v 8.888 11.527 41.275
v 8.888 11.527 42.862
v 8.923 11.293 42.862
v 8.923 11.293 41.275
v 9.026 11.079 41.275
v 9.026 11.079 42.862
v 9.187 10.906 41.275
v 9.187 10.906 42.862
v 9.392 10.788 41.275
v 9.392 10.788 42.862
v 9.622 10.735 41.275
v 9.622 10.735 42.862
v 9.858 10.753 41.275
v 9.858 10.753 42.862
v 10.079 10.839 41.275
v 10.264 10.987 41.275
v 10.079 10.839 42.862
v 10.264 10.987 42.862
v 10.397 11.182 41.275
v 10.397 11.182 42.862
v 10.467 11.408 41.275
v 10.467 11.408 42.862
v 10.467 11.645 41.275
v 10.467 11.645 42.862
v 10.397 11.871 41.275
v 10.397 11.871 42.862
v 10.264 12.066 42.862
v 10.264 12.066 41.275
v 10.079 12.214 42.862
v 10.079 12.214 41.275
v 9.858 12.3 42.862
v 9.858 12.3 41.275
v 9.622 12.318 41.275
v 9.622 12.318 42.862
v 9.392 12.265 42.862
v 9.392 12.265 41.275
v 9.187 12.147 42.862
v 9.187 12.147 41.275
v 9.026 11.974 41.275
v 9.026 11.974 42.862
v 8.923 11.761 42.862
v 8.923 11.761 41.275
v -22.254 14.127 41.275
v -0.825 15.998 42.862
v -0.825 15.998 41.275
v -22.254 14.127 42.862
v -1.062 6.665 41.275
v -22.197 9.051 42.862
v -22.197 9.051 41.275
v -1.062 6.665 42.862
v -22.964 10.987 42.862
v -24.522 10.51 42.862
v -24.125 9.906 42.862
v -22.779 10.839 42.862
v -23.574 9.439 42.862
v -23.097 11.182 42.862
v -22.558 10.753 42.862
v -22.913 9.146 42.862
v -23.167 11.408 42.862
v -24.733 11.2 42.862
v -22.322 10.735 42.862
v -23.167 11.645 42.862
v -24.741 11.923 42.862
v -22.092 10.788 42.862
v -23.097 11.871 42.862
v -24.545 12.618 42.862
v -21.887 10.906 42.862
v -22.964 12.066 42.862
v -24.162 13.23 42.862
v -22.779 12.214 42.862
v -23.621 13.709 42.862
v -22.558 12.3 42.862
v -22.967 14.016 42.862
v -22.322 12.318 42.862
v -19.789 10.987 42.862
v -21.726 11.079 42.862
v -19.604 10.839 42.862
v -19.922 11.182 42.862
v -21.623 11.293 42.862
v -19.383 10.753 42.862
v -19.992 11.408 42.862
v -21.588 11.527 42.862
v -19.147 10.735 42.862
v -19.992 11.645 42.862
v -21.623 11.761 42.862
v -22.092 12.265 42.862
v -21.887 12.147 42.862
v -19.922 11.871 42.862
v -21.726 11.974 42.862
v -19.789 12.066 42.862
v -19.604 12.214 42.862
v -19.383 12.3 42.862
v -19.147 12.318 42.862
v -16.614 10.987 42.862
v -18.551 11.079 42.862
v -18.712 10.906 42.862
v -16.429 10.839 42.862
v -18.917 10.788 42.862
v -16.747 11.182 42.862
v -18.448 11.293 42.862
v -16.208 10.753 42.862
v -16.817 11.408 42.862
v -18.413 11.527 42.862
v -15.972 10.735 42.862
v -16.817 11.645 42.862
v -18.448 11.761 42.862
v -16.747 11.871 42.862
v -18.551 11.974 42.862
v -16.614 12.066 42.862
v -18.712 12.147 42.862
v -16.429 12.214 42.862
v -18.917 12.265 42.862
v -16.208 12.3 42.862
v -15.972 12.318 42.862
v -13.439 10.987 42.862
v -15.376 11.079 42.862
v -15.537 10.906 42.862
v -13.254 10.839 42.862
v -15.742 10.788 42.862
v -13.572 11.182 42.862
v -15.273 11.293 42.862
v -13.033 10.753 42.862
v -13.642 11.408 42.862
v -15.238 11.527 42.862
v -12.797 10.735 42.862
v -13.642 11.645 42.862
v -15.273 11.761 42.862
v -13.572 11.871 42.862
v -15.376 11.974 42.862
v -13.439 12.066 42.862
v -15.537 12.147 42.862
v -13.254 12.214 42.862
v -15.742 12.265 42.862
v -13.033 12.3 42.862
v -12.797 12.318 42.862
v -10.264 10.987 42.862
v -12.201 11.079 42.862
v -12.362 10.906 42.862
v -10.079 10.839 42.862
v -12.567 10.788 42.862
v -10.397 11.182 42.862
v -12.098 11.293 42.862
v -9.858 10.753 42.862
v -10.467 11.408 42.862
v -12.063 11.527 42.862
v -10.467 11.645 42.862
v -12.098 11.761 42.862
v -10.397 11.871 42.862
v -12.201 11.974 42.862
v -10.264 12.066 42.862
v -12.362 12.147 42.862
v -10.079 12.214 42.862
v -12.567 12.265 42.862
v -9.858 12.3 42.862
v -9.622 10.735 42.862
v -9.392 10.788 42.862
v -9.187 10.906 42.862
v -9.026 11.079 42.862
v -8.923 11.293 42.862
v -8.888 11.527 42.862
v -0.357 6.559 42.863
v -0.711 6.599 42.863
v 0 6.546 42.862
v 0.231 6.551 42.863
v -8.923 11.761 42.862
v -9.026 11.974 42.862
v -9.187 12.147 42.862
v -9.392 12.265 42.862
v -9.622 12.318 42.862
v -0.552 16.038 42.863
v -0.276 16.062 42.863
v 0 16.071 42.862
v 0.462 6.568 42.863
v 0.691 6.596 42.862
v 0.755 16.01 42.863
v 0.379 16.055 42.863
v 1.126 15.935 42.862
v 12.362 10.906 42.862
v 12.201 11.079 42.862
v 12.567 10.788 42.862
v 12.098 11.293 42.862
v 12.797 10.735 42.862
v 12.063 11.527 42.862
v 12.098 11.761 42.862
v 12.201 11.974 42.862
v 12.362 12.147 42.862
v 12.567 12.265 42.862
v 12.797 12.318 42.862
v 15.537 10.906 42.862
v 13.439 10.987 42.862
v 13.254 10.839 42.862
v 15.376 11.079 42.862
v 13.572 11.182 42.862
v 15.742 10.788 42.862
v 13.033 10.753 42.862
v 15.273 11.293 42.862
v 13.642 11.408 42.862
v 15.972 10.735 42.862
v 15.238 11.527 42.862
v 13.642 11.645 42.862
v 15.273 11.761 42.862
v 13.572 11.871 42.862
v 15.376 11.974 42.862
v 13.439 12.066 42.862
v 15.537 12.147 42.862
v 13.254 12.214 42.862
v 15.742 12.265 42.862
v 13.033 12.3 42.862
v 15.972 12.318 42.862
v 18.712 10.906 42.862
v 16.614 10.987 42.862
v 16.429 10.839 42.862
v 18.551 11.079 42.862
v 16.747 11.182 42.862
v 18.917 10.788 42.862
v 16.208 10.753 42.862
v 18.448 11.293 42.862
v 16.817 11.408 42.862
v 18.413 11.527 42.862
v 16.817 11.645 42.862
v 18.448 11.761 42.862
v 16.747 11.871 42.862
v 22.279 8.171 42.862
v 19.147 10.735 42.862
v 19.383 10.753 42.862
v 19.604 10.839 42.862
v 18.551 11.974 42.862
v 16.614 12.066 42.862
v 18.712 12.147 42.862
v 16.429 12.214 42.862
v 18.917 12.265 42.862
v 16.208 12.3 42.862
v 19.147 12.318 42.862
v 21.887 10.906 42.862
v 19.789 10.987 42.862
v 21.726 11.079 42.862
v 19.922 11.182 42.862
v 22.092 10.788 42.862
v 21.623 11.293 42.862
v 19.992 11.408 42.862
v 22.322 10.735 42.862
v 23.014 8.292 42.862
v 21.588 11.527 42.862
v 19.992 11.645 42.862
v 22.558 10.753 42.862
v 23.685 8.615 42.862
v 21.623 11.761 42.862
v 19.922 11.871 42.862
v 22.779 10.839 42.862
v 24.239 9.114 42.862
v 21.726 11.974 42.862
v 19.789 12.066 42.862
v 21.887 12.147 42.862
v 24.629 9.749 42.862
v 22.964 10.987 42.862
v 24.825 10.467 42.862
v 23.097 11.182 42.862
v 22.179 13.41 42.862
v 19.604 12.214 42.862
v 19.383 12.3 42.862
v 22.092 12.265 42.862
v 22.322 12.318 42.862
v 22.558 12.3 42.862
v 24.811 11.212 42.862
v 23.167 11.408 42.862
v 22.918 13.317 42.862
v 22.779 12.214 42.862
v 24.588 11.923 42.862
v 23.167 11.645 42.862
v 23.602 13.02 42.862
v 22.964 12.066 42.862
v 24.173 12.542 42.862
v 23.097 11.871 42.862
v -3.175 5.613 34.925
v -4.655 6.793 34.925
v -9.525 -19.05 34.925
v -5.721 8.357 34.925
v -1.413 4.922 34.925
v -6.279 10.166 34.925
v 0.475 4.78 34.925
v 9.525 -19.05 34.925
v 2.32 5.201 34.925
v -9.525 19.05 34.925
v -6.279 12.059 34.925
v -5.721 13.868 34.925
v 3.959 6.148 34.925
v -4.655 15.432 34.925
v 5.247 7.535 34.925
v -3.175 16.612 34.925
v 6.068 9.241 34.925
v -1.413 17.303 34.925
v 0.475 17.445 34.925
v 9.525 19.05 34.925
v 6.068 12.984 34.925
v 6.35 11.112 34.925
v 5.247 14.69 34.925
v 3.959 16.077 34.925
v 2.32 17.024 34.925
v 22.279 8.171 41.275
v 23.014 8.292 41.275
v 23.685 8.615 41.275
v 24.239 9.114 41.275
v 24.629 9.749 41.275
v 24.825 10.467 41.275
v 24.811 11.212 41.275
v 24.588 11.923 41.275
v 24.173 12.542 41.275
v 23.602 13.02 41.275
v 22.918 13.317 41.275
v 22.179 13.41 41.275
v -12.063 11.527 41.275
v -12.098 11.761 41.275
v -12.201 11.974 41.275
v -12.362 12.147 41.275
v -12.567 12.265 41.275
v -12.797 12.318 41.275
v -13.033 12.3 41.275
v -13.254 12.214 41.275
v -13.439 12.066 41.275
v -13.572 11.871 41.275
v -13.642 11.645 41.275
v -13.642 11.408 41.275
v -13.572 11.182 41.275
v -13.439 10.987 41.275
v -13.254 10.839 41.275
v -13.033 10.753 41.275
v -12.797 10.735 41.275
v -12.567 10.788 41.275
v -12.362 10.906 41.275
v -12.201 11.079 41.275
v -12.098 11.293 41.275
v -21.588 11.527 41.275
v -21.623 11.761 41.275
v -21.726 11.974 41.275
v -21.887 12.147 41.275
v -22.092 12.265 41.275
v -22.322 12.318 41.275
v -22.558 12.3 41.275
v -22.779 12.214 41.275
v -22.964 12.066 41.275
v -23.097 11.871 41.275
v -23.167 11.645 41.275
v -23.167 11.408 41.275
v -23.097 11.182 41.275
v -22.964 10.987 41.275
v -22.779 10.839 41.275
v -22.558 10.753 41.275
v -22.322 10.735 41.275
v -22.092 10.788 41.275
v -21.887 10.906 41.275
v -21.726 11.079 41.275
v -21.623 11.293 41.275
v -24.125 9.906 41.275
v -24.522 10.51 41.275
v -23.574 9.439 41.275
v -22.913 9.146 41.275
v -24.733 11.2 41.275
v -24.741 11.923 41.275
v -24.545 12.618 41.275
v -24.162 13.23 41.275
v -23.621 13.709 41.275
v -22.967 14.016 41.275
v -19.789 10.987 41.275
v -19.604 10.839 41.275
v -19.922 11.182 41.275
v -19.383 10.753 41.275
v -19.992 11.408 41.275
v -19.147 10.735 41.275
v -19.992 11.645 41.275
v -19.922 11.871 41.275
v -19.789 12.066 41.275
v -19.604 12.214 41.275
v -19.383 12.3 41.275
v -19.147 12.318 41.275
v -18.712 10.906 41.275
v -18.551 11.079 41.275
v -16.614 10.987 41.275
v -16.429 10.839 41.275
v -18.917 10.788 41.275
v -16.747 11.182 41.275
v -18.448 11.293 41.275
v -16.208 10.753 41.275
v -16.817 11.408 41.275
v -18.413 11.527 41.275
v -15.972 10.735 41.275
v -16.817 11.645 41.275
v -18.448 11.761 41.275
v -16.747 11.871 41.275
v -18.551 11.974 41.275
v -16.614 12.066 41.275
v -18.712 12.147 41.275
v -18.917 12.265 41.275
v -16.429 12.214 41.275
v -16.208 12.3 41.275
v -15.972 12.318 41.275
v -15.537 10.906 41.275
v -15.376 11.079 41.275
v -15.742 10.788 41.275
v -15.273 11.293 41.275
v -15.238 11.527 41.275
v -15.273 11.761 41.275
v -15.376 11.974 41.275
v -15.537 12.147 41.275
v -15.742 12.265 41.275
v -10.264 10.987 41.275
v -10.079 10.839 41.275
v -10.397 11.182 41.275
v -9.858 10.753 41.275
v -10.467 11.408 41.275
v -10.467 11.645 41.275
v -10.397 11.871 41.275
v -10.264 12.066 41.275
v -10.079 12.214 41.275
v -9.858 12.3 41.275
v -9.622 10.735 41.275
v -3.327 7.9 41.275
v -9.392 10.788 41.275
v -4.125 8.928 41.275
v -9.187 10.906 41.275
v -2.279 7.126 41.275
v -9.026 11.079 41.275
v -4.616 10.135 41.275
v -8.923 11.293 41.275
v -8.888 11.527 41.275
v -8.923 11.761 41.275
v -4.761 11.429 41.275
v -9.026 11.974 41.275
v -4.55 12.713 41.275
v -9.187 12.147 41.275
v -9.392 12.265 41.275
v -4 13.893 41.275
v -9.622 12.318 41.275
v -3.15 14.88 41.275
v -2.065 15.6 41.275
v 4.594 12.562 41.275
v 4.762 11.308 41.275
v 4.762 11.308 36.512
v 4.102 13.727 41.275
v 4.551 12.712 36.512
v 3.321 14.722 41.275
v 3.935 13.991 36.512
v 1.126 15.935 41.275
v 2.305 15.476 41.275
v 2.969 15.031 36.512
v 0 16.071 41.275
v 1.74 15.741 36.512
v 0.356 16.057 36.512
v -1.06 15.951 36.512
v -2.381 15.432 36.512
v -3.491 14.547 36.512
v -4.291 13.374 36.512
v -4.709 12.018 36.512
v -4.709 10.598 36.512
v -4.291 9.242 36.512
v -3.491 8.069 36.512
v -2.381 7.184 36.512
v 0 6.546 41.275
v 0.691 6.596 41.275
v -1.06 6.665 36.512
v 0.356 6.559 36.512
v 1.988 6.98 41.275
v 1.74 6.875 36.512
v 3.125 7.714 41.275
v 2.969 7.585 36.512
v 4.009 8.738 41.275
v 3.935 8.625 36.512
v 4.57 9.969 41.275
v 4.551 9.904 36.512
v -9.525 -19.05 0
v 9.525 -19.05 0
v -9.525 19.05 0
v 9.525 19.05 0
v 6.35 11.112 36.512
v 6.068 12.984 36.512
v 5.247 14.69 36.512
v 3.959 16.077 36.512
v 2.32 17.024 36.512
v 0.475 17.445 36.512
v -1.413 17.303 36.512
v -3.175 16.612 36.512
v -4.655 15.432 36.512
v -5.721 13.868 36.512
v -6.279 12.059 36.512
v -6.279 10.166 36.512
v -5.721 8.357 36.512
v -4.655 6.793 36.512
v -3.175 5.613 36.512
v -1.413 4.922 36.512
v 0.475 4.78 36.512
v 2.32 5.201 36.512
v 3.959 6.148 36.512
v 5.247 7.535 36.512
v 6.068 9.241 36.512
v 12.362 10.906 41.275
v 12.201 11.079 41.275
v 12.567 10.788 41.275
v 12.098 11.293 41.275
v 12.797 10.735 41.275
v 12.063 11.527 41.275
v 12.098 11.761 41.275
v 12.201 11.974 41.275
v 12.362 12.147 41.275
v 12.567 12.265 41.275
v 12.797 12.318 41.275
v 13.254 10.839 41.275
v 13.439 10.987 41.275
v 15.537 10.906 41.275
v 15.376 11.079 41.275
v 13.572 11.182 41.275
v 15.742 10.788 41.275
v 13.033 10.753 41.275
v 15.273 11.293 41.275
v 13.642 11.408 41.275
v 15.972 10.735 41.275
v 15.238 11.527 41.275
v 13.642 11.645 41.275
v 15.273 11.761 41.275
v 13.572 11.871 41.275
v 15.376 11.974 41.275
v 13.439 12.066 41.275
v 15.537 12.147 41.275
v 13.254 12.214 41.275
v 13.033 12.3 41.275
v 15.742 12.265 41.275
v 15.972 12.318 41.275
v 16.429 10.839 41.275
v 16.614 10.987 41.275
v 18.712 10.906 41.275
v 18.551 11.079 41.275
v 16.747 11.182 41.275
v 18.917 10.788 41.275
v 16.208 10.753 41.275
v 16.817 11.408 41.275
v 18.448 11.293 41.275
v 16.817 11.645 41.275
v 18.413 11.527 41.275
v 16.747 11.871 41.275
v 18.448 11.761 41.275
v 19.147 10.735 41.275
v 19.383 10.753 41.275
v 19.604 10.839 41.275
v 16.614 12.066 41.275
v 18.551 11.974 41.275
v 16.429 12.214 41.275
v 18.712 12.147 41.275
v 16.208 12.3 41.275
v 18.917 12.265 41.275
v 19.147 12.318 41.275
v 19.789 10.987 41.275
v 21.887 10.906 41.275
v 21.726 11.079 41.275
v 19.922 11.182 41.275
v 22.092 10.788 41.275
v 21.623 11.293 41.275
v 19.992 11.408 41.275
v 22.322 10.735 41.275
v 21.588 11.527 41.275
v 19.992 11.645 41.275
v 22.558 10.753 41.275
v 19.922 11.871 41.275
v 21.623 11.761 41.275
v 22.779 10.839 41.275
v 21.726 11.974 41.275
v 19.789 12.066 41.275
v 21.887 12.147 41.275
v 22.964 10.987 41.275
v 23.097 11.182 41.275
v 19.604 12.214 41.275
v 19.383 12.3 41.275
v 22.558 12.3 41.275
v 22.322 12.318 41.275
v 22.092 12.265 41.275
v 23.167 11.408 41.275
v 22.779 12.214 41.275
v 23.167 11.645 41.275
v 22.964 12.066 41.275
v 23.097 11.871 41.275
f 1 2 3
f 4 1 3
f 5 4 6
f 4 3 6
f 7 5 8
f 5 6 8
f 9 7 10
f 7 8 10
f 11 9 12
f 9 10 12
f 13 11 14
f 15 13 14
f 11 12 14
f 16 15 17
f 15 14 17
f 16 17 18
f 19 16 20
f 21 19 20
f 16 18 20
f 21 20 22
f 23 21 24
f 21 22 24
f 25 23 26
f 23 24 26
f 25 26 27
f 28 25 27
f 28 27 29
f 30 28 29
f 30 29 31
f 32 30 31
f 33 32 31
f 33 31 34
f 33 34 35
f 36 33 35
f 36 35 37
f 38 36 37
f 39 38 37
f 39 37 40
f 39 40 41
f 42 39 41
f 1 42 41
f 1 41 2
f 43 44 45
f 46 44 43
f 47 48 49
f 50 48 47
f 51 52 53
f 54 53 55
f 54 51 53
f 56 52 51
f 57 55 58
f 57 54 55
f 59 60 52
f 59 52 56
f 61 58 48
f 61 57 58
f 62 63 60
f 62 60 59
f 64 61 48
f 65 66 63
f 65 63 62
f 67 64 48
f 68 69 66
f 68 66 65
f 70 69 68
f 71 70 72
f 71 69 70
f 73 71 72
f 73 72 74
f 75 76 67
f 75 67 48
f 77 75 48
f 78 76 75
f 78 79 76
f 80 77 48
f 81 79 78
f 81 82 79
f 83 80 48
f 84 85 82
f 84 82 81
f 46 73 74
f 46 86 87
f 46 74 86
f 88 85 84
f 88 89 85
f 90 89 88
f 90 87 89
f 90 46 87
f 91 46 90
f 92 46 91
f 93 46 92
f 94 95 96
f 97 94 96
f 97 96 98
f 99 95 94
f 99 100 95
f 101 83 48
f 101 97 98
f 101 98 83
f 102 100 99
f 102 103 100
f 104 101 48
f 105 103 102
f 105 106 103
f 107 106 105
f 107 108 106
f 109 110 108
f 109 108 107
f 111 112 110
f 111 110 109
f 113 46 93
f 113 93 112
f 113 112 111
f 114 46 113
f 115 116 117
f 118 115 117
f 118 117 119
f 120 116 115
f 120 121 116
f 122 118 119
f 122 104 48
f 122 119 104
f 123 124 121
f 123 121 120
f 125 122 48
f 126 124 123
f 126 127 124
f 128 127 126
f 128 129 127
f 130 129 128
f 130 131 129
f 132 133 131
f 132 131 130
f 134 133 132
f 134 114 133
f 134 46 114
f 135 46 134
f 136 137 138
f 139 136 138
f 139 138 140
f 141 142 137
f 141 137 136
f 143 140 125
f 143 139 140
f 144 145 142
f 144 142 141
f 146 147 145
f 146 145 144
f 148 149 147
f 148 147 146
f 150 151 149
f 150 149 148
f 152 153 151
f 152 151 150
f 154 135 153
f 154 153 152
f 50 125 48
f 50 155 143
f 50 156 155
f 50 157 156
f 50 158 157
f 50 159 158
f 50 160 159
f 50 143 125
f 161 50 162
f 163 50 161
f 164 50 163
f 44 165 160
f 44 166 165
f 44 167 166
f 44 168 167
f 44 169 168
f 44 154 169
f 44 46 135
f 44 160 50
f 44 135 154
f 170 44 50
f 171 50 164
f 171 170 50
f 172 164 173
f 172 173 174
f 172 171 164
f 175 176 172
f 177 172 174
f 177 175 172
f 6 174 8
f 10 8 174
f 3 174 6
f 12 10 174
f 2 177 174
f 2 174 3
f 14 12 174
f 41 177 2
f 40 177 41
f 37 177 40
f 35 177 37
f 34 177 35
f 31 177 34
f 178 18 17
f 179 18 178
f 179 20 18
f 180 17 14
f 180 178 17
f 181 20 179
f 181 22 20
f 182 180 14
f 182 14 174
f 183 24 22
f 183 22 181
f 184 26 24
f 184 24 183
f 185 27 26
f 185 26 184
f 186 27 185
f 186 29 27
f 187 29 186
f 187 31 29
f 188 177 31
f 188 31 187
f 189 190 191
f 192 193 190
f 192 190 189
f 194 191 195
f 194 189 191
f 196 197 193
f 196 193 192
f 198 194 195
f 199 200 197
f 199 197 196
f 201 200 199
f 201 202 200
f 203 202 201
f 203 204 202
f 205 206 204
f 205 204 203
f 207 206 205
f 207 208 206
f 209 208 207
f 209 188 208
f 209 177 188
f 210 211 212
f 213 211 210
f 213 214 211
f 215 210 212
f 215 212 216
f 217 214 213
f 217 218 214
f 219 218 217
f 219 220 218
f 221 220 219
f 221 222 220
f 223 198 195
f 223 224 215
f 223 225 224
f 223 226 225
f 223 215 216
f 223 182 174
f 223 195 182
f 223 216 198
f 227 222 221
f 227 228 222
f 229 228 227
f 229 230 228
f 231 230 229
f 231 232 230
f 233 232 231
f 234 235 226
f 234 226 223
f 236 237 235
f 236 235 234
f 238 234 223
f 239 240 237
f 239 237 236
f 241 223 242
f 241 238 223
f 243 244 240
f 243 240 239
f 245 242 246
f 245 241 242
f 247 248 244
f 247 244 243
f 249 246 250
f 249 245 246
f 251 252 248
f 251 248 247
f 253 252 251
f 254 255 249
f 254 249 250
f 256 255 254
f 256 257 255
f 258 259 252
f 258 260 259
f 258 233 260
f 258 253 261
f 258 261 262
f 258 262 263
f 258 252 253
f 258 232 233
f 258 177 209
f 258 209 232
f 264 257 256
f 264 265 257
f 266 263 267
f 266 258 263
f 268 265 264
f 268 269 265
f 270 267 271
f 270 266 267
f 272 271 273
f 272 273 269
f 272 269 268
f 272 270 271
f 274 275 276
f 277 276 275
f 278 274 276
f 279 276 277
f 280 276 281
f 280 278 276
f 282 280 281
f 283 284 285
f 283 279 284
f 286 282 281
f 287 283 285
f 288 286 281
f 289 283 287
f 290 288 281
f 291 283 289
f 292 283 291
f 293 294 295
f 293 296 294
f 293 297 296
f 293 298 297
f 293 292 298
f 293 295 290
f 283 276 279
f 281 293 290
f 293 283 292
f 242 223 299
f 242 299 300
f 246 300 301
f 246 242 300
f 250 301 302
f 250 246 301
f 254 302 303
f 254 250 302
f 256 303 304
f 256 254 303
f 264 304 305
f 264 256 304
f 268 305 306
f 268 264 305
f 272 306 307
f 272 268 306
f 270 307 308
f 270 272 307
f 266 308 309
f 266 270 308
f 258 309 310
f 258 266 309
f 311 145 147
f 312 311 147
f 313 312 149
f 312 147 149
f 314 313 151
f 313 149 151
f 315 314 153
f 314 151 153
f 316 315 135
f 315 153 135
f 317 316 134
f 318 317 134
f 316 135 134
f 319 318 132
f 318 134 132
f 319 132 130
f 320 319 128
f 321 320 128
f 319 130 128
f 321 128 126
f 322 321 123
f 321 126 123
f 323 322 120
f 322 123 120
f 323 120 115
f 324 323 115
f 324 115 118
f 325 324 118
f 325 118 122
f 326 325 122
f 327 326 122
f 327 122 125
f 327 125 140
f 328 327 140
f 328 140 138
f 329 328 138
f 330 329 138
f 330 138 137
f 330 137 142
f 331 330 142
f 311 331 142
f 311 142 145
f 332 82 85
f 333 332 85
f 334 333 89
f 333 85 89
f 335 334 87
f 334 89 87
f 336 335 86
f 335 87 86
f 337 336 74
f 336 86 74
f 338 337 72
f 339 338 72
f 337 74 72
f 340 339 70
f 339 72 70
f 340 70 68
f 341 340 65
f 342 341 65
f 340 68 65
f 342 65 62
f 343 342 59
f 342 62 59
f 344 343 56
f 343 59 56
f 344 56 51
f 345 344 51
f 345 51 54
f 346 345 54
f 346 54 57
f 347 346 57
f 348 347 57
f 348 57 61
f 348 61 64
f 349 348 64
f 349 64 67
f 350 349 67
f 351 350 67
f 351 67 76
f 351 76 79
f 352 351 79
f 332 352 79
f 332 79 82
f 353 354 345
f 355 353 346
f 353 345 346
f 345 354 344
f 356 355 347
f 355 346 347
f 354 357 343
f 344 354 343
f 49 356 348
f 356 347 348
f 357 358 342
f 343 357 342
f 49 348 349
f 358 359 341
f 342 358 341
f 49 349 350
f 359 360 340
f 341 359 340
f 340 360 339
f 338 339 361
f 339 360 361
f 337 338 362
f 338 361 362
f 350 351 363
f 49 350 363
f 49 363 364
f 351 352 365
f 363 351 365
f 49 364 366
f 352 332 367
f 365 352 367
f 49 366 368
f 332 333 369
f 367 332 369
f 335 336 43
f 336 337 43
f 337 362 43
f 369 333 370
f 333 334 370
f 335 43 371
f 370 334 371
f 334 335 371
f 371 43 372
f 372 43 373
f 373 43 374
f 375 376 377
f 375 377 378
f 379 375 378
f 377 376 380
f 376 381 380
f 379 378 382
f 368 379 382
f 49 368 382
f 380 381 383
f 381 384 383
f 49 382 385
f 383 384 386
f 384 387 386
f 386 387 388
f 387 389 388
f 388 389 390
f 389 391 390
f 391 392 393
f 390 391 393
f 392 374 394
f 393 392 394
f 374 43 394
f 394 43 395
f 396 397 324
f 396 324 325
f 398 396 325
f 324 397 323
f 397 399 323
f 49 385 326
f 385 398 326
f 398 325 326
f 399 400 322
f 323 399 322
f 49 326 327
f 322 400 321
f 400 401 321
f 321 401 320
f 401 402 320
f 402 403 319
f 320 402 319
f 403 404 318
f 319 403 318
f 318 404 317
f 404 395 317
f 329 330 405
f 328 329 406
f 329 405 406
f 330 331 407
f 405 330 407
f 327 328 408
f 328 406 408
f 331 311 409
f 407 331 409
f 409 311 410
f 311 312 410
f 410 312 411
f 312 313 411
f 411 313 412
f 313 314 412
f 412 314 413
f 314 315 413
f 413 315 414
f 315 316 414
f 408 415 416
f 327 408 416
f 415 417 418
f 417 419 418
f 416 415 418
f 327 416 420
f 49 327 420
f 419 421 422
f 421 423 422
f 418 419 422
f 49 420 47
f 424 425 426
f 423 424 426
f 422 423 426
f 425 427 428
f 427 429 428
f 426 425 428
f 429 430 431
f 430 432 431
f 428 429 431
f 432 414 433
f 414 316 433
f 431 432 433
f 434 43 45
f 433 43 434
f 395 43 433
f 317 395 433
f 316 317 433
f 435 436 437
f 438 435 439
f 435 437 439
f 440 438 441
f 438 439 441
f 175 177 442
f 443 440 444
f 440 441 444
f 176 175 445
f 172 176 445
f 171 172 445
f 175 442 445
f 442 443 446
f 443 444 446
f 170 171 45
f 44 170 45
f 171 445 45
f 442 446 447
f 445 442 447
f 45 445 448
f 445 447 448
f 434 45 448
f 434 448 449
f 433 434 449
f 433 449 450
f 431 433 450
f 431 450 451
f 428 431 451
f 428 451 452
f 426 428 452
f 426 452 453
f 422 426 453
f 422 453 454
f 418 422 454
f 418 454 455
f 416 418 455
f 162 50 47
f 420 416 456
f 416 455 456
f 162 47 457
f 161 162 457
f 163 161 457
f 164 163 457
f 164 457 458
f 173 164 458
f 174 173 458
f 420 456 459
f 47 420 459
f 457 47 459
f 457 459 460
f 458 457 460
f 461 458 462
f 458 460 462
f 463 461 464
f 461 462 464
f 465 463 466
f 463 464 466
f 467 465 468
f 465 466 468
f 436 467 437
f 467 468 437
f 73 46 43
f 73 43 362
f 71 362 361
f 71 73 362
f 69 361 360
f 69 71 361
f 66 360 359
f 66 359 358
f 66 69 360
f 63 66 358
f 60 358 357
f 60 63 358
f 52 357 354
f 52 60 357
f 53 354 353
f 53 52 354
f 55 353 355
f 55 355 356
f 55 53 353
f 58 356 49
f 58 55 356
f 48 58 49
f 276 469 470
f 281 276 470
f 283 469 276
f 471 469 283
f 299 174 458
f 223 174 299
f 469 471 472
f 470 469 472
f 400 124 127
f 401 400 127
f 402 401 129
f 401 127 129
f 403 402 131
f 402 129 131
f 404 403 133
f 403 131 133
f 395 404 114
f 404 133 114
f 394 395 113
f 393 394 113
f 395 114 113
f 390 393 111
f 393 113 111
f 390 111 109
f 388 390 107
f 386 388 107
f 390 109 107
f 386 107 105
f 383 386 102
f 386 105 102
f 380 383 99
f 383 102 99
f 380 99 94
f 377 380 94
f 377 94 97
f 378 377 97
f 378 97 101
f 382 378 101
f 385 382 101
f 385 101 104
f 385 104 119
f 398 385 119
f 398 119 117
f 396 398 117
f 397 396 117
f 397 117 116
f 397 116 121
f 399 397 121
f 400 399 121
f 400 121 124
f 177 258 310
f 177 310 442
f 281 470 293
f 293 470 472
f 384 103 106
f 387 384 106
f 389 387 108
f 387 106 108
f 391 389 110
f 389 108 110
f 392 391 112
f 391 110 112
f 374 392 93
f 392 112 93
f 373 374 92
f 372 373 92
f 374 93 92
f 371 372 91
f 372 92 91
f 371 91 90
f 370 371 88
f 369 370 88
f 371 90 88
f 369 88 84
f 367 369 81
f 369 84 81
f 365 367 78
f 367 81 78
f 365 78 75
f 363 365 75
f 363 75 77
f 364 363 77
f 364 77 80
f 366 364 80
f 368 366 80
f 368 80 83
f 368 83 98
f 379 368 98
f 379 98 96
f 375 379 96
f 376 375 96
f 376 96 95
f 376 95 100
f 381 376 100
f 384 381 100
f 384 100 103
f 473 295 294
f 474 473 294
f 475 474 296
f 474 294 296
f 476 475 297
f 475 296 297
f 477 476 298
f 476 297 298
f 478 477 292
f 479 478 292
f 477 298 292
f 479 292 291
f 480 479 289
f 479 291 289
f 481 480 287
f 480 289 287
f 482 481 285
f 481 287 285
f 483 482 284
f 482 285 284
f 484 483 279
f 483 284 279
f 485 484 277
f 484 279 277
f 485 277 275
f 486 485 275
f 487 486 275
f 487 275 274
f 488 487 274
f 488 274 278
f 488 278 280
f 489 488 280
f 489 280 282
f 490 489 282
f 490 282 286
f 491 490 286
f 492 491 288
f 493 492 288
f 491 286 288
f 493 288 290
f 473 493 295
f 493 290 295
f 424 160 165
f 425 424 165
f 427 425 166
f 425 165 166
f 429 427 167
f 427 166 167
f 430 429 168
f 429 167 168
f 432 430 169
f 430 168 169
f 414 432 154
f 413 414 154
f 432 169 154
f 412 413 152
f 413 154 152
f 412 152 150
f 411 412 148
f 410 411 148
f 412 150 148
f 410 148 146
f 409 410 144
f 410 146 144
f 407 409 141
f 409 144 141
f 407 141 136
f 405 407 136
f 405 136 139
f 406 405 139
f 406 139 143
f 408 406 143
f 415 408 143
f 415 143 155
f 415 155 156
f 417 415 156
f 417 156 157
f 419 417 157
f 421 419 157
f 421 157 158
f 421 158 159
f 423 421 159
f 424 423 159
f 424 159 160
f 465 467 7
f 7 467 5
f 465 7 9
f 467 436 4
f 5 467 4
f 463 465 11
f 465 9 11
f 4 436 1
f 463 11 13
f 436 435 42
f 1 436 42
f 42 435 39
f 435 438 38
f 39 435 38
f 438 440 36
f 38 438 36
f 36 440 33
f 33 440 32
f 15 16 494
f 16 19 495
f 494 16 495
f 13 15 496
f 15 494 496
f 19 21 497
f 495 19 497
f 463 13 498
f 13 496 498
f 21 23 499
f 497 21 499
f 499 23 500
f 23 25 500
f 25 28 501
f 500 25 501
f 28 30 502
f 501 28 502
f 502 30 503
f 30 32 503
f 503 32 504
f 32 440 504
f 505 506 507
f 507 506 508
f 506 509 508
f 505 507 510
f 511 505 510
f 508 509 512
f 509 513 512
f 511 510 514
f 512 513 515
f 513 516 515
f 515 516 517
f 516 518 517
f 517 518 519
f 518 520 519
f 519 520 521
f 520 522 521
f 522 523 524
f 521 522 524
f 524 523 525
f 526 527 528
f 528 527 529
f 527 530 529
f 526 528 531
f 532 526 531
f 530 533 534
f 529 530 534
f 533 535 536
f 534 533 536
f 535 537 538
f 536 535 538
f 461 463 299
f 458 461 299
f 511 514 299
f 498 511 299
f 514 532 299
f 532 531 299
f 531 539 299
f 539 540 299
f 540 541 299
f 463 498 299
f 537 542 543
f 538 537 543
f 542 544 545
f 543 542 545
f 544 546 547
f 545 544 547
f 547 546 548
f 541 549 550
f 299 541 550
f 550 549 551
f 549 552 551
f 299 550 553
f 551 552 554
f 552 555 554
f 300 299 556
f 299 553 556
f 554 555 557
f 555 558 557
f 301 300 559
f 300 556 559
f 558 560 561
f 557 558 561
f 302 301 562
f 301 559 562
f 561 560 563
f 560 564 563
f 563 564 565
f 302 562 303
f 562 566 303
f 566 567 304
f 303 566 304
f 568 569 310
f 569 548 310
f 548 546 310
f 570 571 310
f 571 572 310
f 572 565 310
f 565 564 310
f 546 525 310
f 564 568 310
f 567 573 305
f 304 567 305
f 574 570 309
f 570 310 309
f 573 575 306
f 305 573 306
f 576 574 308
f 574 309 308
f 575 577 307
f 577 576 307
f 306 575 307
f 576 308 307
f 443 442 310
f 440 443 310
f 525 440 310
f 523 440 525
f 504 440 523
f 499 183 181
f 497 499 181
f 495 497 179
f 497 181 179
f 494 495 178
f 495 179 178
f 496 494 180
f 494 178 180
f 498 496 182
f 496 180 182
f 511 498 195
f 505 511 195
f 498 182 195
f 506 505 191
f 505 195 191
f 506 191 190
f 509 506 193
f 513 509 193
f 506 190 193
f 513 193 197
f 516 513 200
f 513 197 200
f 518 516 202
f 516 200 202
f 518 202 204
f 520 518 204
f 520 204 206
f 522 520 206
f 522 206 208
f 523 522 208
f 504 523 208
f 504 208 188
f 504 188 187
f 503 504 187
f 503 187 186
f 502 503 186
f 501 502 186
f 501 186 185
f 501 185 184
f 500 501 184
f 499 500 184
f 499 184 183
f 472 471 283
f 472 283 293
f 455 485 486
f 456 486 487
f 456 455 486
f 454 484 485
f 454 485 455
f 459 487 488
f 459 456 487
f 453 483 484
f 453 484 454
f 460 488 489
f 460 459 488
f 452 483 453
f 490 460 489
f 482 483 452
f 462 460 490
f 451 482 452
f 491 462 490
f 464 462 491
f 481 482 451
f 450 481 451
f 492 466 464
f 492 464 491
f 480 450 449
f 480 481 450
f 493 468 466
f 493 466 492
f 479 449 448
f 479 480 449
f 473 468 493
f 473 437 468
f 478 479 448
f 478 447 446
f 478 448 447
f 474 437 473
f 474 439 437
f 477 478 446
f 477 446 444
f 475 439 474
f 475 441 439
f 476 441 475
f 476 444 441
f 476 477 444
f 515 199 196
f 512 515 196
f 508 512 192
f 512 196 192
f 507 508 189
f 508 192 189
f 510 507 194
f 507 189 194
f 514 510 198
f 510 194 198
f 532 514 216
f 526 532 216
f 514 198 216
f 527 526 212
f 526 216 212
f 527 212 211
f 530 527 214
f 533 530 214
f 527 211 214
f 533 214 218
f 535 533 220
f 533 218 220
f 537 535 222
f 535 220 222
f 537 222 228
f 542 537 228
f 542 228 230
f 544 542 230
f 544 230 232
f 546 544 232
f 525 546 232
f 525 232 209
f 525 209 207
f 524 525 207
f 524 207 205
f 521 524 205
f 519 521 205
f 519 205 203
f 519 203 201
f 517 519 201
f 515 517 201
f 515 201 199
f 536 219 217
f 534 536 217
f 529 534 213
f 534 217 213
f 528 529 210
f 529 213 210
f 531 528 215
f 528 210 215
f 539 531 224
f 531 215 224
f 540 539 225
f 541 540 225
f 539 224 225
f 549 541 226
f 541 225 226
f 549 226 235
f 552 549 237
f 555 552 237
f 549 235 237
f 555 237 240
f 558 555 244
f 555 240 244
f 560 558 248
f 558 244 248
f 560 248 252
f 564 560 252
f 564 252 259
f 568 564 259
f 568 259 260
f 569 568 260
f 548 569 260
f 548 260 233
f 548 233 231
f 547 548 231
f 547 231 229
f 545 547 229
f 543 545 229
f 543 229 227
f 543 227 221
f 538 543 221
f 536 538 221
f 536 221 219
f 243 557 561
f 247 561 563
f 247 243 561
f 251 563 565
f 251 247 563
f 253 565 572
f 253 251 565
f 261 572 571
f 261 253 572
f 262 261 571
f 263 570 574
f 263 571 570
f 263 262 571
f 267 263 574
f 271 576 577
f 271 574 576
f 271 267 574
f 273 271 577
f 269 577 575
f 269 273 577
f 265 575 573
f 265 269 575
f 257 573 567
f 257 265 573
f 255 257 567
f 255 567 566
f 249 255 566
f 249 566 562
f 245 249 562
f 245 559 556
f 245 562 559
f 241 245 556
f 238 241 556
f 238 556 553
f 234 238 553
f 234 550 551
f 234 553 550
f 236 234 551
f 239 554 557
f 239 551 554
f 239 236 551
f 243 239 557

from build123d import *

# Parameters (mm, degrees)
SKETCH1_W               = 19.05
SKETCH1_H               = 38.1
BOSS_EXTRUDE1_DEPTH     = 34.925
SKETCH2_R               = 6.35
BOSS_EXTRUDE2_DEPTH     = 1.5875
SKETCH3_R               = 4.7625
BOSS_EXTRUDE3_DEPTH     = 6.35
BOSS_EXTRUDE4_DEPTH     = 1.5875
SKETCH5_R               = 0.79375
CUT_EXTRUDE1_DEPTH      = 6.35
LPATTERN1_COUNT         = 5
LPATTERN1_PITCH         = 3.175
MIRROR1_COPY_1_SKETCH_R = 0.79375
MIRROR1_COPY_1_DEPTH    = 6.35
MIRROR1_COPY_2_SKETCH_R = 0.79375
MIRROR1_COPY_2_DEPTH    = 6.35
MIRROR1_COPY_3_SKETCH_R = 0.79375
MIRROR1_COPY_3_DEPTH    = 6.35
MIRROR1_COPY_4_SKETCH_R = 0.79375
MIRROR1_COPY_4_DEPTH    = 6.35


with BuildPart() as part:
    # Sketch1 → Boss-Extrude1 (new body)
    with BuildSketch(Plane.XY):
        Rectangle(SKETCH1_W, SKETCH1_H)
    extrude(amount=BOSS_EXTRUDE1_DEPTH)

    # Sketch2 → Boss-Extrude2 (add)
    with BuildSketch(Plane.XY.offset(34.925)):
        with Locations((0, 11.1125)):
            Circle(SKETCH2_R)
    extrude(amount=BOSS_EXTRUDE2_DEPTH)

    # Sketch3 → Boss-Extrude3 (add)
    with BuildSketch(Plane.XY.offset(36.5125)):
        with Locations((0, 11.30801151)):
            Circle(SKETCH3_R)
    extrude(amount=BOSS_EXTRUDE3_DEPTH)

    # Sketch4 → Boss-Extrude4 (add)
    with BuildSketch(Plane.XY.offset(42.8625)):
        with BuildLine():
            Line((0, 16.07051151), (-22.253587721, 14.127262895))
            ThreePointArc((-22.253587721, 14.127262895), (-24.76292538, 11.561183994), (-22.197271079, 9.051412208))
            Line((-22.197271079, 9.051412208), (0, 6.54551151))
            Line((0, 6.54551151), (22.279071817, 8.170731681))
            ThreePointArc((22.279071817, 8.170731681), (24.844676693, 10.840221296), (22.179280362, 13.410078409))
            Line((22.179280362, 13.410078409), (0, 16.07051151))
        make_face()
    extrude(amount=-BOSS_EXTRUDE4_DEPTH)

    # Sketch5 → Cut-Extrude1 (cut)
    with BuildSketch(Plane.XY.offset(42.8625)):
        with Locations((-22.38167538, 11.526576548)):
            Circle(SKETCH5_R)
    cut_extrude1 = extrude(amount=-CUT_EXTRUDE1_DEPTH, mode=Mode.SUBTRACT)

    # LPattern1: Cut-Extrude1 ×5
    with Locations(*[(i * LPATTERN1_PITCH, 0, 0) for i in range(1, LPATTERN1_COUNT)]):
        add(cut_extrude1, mode=Mode.SUBTRACT)

    # Mirror1: Cut-Extrude1 across plane
    add(cut_extrude1.mirror(Plane(origin=(0, 0, 0), x_dir=(0, 0, 1), z_dir=(1, 0, 0))), mode=Mode.SUBTRACT)

    # Mirror1 copy 1 sketch → Mirror1 copy 1 (cut)
    with BuildSketch(Plane(origin=(-3.175, 0, 42.8625), x_dir=(-1, 0, 0), z_dir=(0, 0, 1))):
        with Locations((-22.38167538, -11.526576548)):
            Circle(MIRROR1_COPY_1_SKETCH_R)
    extrude(amount=-MIRROR1_COPY_1_DEPTH, mode=Mode.SUBTRACT)

    # Mirror1 copy 2 sketch → Mirror1 copy 2 (cut)
    with BuildSketch(Plane(origin=(-6.35, 0, 42.8625), x_dir=(-1, 0, 0), z_dir=(0, 0, 1))):
        with Locations((-22.38167538, -11.526576548)):
            Circle(MIRROR1_COPY_2_SKETCH_R)
    extrude(amount=-MIRROR1_COPY_2_DEPTH, mode=Mode.SUBTRACT)

    # Mirror1 copy 3 sketch → Mirror1 copy 3 (cut)
    with BuildSketch(Plane(origin=(-9.525, 0, 42.8625), x_dir=(-1, 0, 0), z_dir=(0, 0, 1))):
        with Locations((-22.38167538, -11.526576548)):
            Circle(MIRROR1_COPY_3_SKETCH_R)
    extrude(amount=-MIRROR1_COPY_3_DEPTH, mode=Mode.SUBTRACT)

    # Mirror1 copy 4 sketch → Mirror1 copy 4 (cut)
    with BuildSketch(Plane(origin=(-12.7, 0, 42.8625), x_dir=(-1, 0, 0), z_dir=(0, 0, 1))):
        with Locations((-22.38167538, -11.526576548)):
            Circle(MIRROR1_COPY_4_SKETCH_R)
    extrude(amount=-MIRROR1_COPY_4_DEPTH, mode=Mode.SUBTRACT)


solid = part.part
